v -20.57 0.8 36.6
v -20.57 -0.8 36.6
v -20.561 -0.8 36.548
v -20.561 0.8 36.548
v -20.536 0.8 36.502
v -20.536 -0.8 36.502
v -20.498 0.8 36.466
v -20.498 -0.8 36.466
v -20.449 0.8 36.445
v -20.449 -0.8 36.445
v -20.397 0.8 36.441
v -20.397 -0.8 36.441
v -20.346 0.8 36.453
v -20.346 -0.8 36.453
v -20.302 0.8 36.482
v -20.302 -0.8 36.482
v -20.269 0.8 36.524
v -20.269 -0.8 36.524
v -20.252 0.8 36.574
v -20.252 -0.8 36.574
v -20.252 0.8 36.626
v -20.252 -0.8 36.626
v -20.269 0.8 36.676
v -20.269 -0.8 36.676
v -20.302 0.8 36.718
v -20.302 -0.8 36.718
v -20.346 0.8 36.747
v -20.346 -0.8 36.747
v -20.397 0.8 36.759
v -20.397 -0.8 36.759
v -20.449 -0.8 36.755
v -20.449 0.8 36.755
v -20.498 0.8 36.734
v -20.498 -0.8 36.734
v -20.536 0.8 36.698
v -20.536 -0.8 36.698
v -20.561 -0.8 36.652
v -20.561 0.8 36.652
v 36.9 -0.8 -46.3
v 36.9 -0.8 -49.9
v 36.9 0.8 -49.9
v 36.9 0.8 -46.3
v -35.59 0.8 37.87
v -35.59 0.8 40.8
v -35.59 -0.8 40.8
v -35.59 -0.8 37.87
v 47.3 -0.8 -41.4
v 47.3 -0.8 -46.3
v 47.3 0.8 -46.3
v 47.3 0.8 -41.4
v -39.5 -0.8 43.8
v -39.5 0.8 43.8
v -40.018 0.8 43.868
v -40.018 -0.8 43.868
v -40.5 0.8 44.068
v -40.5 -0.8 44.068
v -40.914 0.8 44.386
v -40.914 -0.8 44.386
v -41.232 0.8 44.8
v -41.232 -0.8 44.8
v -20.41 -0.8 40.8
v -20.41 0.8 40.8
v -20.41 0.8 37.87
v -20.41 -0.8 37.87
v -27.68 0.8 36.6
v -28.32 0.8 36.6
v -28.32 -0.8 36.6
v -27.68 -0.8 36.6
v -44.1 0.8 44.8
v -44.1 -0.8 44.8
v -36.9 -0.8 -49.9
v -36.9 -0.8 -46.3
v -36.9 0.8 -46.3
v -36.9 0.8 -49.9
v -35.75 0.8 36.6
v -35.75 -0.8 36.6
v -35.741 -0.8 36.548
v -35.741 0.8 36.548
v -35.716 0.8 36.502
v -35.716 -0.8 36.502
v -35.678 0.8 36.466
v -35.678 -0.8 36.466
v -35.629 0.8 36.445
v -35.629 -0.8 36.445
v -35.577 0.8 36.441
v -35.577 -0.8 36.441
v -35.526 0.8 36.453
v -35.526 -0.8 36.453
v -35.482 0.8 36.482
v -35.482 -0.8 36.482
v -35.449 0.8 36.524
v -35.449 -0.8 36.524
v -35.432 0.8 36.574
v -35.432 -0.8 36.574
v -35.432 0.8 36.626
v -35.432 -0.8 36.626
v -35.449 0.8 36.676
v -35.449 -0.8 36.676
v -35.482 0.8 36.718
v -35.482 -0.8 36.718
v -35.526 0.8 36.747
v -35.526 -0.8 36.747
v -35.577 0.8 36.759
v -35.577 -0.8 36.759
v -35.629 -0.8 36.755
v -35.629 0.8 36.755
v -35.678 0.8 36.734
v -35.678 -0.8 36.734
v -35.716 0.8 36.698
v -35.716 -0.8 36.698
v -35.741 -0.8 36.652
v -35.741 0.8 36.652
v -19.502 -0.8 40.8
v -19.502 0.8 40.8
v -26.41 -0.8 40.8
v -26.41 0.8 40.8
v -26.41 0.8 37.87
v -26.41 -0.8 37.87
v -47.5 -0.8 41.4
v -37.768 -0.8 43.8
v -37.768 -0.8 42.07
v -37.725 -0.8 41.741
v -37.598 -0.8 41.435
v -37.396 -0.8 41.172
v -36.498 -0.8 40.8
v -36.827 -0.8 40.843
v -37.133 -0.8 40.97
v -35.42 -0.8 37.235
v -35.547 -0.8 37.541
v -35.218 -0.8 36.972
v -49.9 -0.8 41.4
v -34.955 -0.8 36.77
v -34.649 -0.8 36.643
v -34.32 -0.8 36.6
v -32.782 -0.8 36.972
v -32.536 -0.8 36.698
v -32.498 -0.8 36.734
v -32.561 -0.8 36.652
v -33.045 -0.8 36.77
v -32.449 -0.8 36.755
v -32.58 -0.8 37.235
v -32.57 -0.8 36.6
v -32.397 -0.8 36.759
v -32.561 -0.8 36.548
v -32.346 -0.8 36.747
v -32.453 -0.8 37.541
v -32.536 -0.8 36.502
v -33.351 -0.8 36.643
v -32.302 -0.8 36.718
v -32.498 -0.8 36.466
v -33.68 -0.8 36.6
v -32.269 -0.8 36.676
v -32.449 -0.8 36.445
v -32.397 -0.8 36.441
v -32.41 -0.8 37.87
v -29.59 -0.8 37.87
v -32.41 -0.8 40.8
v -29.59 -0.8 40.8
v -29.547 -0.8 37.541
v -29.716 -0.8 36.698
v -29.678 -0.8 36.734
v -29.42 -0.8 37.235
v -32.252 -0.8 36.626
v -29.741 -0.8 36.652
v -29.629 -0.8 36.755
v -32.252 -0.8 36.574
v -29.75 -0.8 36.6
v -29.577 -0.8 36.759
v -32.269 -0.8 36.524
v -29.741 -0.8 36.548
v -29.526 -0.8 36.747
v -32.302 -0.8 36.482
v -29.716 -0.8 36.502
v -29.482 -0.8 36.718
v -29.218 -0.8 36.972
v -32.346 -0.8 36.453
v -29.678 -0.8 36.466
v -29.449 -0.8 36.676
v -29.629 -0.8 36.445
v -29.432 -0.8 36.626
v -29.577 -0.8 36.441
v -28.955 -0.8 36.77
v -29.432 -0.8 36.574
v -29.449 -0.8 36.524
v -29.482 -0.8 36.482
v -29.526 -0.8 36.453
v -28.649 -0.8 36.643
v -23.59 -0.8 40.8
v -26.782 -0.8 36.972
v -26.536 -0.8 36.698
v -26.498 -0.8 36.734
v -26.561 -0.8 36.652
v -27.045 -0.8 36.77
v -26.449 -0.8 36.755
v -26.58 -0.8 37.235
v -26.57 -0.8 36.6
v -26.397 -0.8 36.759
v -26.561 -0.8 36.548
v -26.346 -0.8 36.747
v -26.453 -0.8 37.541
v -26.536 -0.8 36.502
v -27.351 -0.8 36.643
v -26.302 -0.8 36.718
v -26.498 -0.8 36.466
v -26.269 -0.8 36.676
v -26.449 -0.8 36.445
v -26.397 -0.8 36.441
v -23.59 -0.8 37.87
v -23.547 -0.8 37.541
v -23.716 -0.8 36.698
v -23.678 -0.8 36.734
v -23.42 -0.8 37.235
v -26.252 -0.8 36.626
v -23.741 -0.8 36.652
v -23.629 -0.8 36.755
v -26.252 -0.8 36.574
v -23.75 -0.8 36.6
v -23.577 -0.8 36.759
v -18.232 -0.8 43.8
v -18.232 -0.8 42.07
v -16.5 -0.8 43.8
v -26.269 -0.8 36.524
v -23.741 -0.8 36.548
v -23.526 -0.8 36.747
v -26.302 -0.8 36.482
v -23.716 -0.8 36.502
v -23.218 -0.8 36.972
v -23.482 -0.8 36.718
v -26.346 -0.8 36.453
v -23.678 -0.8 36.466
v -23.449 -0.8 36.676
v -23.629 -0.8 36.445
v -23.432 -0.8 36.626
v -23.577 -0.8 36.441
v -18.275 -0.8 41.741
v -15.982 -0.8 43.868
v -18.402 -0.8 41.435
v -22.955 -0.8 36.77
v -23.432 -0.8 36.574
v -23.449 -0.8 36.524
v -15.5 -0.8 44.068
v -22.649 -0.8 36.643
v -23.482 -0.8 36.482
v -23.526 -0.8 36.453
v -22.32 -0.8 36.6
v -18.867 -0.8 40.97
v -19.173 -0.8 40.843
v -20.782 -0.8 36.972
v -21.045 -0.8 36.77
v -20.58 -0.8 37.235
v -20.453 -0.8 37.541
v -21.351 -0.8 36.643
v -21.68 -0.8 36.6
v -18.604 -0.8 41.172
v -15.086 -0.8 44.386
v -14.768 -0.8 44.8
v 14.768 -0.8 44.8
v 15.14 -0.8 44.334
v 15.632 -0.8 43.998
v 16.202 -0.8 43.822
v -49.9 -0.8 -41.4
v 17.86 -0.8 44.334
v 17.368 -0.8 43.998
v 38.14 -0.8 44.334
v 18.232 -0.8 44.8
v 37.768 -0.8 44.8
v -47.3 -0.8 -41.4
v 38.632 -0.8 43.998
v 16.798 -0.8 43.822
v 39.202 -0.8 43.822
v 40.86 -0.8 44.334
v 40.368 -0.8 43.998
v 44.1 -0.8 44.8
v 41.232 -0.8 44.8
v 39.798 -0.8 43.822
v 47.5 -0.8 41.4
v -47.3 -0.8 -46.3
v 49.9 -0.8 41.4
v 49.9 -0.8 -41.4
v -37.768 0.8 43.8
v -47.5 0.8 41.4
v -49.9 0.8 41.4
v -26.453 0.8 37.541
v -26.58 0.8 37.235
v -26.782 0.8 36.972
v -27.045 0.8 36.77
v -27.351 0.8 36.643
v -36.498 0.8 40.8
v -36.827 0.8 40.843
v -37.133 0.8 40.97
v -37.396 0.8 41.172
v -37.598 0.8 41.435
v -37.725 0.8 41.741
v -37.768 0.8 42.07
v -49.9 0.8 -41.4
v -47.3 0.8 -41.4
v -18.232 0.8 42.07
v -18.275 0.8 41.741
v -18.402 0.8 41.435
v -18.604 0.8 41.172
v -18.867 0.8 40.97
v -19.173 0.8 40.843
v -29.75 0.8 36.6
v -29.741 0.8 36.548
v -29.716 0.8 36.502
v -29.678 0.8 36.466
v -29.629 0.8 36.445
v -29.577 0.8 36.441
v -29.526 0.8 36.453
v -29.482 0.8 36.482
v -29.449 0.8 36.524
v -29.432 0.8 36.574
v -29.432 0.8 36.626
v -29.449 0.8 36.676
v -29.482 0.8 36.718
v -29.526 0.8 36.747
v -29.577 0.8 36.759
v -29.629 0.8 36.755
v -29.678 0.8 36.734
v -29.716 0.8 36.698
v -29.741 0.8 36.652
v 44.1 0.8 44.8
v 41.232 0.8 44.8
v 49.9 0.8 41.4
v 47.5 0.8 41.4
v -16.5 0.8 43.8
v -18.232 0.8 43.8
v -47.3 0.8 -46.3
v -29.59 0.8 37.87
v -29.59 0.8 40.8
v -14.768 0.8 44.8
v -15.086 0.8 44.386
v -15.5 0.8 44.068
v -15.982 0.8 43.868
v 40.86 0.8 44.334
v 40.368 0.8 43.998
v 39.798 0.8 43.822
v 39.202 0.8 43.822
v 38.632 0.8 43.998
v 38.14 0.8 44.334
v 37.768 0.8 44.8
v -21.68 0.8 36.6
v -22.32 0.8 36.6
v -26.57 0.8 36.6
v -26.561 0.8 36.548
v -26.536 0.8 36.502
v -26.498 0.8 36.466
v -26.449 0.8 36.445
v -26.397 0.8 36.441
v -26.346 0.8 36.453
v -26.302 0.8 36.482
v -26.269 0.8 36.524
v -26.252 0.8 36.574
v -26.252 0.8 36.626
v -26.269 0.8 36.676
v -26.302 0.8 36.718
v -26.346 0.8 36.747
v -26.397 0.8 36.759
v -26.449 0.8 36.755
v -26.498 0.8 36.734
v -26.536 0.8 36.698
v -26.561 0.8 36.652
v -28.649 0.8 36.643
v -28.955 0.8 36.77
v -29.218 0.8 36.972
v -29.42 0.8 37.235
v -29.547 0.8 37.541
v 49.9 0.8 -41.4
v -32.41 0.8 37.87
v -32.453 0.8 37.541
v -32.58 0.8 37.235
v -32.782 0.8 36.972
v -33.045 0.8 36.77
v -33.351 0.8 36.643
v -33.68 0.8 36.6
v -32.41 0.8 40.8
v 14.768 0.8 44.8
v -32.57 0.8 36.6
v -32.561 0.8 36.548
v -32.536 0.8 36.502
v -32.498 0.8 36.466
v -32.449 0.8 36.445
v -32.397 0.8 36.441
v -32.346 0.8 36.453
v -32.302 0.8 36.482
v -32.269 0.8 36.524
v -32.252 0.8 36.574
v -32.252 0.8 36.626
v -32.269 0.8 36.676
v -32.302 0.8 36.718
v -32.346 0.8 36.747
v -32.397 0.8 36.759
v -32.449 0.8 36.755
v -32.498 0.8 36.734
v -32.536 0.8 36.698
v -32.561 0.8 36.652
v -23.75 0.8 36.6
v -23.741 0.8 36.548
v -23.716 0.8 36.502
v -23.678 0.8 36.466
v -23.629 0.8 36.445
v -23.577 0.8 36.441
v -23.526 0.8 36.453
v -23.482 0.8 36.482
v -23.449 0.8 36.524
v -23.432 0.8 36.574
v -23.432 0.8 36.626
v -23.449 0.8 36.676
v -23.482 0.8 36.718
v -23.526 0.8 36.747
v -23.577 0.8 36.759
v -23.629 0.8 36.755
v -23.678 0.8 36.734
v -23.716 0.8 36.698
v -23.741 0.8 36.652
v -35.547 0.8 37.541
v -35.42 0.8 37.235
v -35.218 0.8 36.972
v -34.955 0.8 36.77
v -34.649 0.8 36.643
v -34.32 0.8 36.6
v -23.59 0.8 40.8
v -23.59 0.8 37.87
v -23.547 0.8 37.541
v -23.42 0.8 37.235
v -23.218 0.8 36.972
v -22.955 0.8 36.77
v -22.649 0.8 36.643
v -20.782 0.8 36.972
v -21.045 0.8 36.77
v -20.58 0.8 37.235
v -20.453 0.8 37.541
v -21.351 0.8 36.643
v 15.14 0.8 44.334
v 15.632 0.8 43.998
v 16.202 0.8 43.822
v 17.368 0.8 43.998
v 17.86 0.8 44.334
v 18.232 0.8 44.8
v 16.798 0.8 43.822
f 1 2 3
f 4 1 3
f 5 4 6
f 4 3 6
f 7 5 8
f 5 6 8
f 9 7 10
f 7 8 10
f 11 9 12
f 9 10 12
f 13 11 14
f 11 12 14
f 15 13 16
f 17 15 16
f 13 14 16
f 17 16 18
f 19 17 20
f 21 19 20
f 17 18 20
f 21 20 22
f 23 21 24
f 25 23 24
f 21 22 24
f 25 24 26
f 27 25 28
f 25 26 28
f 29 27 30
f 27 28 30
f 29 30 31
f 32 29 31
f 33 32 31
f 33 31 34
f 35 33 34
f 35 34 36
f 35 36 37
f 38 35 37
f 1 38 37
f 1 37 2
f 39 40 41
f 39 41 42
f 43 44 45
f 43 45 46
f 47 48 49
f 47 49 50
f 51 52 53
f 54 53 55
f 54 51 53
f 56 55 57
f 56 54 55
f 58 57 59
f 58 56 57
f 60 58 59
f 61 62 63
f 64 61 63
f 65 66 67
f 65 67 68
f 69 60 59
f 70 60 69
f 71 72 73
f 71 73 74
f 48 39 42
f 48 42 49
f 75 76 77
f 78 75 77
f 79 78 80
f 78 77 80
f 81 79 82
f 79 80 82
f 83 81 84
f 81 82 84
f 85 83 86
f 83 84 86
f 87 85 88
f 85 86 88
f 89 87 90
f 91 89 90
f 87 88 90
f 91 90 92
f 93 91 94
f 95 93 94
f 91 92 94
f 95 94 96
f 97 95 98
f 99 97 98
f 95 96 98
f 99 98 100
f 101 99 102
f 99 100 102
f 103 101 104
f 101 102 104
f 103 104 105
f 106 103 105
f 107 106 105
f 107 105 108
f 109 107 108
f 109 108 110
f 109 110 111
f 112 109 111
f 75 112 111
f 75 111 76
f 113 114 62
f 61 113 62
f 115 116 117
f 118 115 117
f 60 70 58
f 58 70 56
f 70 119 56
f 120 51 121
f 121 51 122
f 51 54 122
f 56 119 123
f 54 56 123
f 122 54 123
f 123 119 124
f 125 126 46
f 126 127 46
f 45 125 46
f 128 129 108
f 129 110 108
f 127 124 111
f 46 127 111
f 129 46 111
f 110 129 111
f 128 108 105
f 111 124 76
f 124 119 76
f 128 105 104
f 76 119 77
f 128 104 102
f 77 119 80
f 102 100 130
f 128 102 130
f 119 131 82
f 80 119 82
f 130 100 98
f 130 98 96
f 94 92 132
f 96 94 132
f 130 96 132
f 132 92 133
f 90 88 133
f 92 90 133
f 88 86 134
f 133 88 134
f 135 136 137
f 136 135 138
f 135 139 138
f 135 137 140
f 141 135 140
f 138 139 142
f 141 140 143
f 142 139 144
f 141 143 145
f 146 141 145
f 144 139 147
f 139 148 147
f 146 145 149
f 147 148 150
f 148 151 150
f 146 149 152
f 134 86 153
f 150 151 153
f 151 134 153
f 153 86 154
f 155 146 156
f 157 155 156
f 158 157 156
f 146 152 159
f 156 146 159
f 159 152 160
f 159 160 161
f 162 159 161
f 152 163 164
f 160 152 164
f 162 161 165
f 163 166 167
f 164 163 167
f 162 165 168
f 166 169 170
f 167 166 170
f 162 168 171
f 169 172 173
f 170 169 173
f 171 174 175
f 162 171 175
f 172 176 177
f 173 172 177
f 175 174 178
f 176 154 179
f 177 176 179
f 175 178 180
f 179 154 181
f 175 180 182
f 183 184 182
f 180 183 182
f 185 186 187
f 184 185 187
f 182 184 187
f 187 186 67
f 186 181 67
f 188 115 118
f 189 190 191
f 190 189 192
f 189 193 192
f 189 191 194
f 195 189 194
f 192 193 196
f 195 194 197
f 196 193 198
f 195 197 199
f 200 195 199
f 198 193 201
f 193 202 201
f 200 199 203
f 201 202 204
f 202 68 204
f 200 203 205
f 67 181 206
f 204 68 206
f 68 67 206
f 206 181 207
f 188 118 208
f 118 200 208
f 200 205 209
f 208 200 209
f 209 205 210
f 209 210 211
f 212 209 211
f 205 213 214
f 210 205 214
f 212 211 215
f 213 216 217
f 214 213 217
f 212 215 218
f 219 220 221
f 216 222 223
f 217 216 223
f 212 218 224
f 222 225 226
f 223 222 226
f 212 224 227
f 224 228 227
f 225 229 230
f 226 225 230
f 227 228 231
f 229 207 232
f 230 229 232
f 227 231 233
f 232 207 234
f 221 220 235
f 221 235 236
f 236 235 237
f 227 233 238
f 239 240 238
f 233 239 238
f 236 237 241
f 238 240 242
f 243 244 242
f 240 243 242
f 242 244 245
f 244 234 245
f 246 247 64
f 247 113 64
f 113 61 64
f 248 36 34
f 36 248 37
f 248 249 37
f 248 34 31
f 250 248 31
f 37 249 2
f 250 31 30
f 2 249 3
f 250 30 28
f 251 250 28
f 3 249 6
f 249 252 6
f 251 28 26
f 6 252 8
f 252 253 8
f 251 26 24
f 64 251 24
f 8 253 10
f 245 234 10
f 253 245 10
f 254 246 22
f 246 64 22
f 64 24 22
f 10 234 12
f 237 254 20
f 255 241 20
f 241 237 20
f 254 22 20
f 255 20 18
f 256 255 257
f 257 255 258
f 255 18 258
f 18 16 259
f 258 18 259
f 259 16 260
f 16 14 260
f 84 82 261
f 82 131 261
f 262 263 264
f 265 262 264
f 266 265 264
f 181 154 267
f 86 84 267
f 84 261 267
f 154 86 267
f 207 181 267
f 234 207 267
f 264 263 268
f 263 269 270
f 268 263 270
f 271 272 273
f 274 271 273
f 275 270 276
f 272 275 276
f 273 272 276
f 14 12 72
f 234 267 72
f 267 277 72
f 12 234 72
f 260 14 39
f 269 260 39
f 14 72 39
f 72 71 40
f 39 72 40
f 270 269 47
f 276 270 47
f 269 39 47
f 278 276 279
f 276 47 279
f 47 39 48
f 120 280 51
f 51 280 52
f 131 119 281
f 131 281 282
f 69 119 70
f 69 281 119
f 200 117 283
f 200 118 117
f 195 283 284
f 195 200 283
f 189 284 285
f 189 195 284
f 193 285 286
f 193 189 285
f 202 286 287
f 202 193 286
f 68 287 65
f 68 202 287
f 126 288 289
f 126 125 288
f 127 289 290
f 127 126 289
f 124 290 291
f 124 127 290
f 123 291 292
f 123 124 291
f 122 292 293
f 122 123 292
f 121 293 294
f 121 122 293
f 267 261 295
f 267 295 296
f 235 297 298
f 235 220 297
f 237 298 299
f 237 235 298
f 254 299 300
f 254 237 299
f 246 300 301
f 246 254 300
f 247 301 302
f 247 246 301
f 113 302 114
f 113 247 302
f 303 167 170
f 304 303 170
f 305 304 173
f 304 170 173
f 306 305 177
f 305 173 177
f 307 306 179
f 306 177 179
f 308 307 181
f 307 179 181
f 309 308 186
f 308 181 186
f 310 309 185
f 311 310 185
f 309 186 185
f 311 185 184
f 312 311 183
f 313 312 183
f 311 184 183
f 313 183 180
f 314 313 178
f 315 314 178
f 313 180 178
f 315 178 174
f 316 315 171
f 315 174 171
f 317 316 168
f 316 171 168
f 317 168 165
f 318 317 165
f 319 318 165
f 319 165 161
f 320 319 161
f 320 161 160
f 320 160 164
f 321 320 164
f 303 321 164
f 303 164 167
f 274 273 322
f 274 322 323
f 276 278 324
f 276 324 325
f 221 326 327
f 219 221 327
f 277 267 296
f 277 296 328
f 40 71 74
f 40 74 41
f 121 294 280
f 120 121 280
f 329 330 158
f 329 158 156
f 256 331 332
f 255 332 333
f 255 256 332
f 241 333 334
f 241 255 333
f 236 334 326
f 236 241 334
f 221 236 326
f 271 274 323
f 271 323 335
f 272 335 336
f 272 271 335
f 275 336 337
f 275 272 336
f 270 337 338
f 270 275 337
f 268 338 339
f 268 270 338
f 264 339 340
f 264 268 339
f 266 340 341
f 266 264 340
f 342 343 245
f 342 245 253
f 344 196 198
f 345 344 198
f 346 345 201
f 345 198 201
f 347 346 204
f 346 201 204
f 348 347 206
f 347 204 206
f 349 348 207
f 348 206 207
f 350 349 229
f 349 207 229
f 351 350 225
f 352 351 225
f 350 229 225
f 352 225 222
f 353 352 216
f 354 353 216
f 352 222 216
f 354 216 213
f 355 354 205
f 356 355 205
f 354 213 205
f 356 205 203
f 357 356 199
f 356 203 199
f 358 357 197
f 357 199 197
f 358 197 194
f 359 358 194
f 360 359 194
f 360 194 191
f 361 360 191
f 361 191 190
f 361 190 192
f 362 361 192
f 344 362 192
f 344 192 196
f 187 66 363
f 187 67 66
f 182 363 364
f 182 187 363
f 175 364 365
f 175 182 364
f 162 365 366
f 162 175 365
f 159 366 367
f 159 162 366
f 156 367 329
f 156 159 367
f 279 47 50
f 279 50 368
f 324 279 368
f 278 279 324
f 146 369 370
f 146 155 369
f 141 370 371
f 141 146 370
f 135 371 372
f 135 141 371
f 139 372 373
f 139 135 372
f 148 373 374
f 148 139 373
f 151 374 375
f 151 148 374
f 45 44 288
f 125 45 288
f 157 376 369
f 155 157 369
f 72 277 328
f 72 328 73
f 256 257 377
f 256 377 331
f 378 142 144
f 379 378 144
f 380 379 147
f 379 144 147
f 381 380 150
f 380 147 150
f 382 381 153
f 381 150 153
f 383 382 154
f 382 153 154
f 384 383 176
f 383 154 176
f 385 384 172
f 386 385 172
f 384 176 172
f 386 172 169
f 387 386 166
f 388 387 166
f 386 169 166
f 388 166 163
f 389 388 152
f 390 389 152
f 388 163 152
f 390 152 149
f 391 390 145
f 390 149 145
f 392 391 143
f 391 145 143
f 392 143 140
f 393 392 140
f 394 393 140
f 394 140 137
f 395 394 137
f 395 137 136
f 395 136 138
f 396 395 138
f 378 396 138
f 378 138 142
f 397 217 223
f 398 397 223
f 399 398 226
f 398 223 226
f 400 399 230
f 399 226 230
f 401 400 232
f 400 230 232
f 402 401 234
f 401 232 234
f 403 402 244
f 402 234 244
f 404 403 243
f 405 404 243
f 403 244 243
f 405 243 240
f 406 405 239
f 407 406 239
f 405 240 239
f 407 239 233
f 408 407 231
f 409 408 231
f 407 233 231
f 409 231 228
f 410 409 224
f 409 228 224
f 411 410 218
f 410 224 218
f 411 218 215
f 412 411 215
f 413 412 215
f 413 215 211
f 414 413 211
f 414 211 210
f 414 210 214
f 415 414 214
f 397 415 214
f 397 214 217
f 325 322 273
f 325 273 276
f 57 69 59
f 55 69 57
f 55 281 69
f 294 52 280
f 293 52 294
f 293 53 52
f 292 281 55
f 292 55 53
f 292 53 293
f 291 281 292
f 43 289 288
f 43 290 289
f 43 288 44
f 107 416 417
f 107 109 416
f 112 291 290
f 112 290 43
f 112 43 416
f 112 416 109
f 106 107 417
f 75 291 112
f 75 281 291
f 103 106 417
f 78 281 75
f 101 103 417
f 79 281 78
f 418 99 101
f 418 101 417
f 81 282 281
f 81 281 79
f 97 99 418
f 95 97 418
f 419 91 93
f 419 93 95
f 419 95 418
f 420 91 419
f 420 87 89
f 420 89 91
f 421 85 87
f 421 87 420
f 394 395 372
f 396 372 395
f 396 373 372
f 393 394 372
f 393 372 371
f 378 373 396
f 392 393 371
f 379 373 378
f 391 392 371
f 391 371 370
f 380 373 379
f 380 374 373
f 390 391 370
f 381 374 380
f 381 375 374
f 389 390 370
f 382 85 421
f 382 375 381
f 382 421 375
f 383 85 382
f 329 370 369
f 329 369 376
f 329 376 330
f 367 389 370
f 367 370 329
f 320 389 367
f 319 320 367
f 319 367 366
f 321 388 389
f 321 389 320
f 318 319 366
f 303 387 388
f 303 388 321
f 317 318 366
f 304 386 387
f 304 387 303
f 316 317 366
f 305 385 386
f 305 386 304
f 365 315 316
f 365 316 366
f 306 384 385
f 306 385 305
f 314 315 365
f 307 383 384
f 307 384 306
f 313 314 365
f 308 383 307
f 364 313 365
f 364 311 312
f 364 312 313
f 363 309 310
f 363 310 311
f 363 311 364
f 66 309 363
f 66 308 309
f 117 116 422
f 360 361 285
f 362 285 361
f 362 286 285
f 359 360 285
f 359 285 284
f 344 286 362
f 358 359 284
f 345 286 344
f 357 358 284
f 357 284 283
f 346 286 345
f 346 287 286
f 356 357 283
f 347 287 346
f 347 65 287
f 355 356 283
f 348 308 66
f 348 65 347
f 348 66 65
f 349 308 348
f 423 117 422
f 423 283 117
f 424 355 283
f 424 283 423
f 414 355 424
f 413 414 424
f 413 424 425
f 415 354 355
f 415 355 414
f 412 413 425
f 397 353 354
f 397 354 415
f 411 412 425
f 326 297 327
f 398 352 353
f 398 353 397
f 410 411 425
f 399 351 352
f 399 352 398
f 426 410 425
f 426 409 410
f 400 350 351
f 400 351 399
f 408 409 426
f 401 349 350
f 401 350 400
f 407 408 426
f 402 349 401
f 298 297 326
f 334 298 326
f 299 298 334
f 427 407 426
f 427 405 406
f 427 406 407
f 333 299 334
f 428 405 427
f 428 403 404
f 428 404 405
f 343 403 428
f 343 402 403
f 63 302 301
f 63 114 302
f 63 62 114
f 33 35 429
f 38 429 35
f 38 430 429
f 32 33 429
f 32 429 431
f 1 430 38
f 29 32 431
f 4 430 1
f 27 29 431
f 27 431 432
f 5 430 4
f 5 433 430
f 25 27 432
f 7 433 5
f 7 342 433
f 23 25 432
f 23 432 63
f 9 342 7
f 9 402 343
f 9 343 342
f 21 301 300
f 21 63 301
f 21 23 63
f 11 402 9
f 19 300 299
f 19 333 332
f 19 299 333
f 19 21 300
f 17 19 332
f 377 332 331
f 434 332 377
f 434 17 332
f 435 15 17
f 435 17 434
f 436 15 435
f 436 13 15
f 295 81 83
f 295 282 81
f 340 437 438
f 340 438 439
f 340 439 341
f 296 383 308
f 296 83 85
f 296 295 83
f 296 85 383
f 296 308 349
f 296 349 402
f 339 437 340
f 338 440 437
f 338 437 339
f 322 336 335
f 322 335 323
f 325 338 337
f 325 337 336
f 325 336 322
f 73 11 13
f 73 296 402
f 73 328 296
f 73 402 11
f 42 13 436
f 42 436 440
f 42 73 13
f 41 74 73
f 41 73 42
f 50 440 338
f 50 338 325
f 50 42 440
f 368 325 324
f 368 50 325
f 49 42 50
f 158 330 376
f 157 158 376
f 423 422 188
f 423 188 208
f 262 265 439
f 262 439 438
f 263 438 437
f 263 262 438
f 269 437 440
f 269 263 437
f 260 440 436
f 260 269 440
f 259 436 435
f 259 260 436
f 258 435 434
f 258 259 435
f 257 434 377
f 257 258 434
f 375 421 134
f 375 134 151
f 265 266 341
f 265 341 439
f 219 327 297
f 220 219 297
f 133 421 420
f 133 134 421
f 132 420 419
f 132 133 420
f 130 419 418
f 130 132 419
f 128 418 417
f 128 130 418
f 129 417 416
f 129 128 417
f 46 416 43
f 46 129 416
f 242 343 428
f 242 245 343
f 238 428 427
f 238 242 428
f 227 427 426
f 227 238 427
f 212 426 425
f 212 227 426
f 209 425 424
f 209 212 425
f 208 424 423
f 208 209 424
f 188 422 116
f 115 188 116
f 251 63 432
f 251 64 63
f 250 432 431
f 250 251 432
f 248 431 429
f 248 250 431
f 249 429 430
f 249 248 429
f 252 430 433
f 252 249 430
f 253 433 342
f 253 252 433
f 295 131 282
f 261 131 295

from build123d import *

# Parameters (mm, degrees)
GENERALSHAPE_DEPTH           = 0.8
ADDTOLERANCE_DEPTH           = 71.715203457
ADDTOLERANCE_DEPTH_BACK      = 71.715203457
BACKPLANE_DEPTH              = 71.573791169
BACKPLANE_DEPTH_BACK         = 71.573791169
RF_W                         = 3.18
RF_H                         = 4.2
CUT_EXTRUDE1_DEPTH           = 71.587392642
FILLET1_R                    = 1.27
F_0_32_0_32_DIAMETER_HOLE1_D = 0.32


with BuildPart() as part:
    # Sketch2 → GeneralShape (new, symmetric)
    with BuildSketch(Plane(origin=(0, 0, 0), x_dir=(1, 0, 0), z_dir=(0, 1, 0))):
        Polygon((47.4, 46.4), (37, 46.4), (37, 50), (-37, 50), (-37, 46.4), (-47.4, 46.4), (-47.4, 41.5), (-50, 41.5), (-50, -41.5), (-47.4, -41.5), (-41.5, -47.4), (41.5, -47.4), (47.4, -41.5), (50, -41.5), (50, 41.5), (47.4, 41.5), align=None)
    extrude(amount=GENERALSHAPE_DEPTH, both=True)

    # Sketch3 → AddTolerance (cut, two sides: drawn at the far end of the back side and taken through both)
    with BuildSketch(Plane(origin=(0, 0, 0), x_dir=(1, 0, 0), z_dir=(0, 1, 0)).offset(-ADDTOLERANCE_DEPTH_BACK)):
        Polygon((37, 50), (-37, 50), (-37, 46.4), (-47.4, 46.4), (-47.4, 41.5), (-50, 41.5), (-50, -41.5), (-47.4, -41.5), (-47.5, -41.4), (-49.9, -41.4), (-49.9, 41.4), (-47.3, 41.4), (-47.3, 46.3), (-36.9, 46.3), (-36.9, 49.9), (36.9, 49.9), (36.9, 46.3), (47.3, 46.3), (47.3, 41.4), (49.9, 41.4), (49.9, -41.4), (47.5, -41.4), (47.4, -41.5), (50, -41.5), (50, 41.5), (47.4, 41.5), (47.4, 46.4), (37, 46.4), align=None)
    extrude(amount=ADDTOLERANCE_DEPTH + ADDTOLERANCE_DEPTH_BACK, mode=Mode.SUBTRACT)

    # Sketch4 → Backplane (cut, two sides: drawn at the far end of the back side and taken through both)
    with BuildSketch(Plane(origin=(0, 0, 0), x_dir=(1, 0, 0), z_dir=(0, 1, 0)).offset(-BACKPLANE_DEPTH_BACK)):
        with BuildLine():
            Line((41.5, -47.4), (44.1, -44.8))
            Line((44.1, -44.8), (41.232050808, -44.8))
            ThreePointArc((41.232050808, -44.8), (39.5, -43.8), (37.767949192, -44.8))
            Line((37.767949192, -44.8), (18.232050808, -44.8))
            ThreePointArc((18.232050808, -44.8), (16.5, -43.8), (14.767949192, -44.8))
            Line((14.767949192, -44.8), (-14.767949192, -44.8))
            ThreePointArc((-14.767949192, -44.8), (-16.5, -43.8), (-18.232050808, -44.8))
            Line((-18.232050808, -44.8), (-37.767949192, -44.8))
            ThreePointArc((-37.767949192, -44.8), (-39.5, -43.8), (-41.232050808, -44.8))
            Line((-41.232050808, -44.8), (-44.1, -44.8))
            Line((-44.1, -44.8), (-41.5, -47.4))
            Line((-41.5, -47.4), (41.5, -47.4))
        make_face()
    extrude(amount=BACKPLANE_DEPTH + BACKPLANE_DEPTH_BACK, mode=Mode.SUBTRACT)

    # RF → Cut-Extrude1 (cut, through all)
    with BuildSketch(Plane(origin=(0, 0.8, 0), x_dir=(1, 0, 0), z_dir=(0, 1, 0))):
        with Locations((-22, -38.7)):
            Rectangle(RF_W, RF_H)
        with Locations((-28, -38.7)):
            Rectangle(RF_W, RF_H)
        with Locations((-34, -38.7)):
            Rectangle(RF_W, RF_H)
        with BuildLine():
            Line((-18.232050808, -40.8), (-20.41, -40.8))
            Line((-20.41, -40.8), (-23.59, -40.8))
            Line((-23.59, -40.8), (-26.41, -40.8))
            Line((-26.41, -40.8), (-29.59, -40.8))
            Line((-29.59, -40.8), (-32.41, -40.8))
            Line((-32.41, -40.8), (-35.59, -40.8))
            Line((-35.59, -40.8), (-37.767949192, -40.8))
            Line((-37.767949192, -40.8), (-37.767949192, -43.8))
            Line((-37.767949192, -43.8), (-39.5, -43.8))
            ThreePointArc((-39.5, -43.8), (-38.5, -44.067949192), (-37.767949192, -44.8))
            Line((-37.767949192, -44.8), (-18.232050808, -44.8))
            ThreePointArc((-18.232050808, -44.8), (-17.5, -44.067949192), (-16.5, -43.8))
            Line((-16.5, -43.8), (-18.232050808, -43.8))
            Line((-18.232050808, -43.8), (-18.232050808, -40.8))
        make_face()
    extrude(amount=-CUT_EXTRUDE1_DEPTH, mode=Mode.SUBTRACT)

    # Fillet1
    fillet1_edges = [part.edges().sort_by_distance(p)[0] for p in [
        (-23.59, 0, 36.6),
        (-20.41, 0, 36.6),
        (-18.232050808, 0, 40.8),
        (-37.767949192, 0, 40.8),
        (-35.59, 0, 36.6),
        (-32.41, 0, 36.6),
        (-29.59, 0, 36.6),
        (-26.41, 0, 36.6),
    ]]
    fillet(fillet1_edges, radius=FILLET1_R)

    # Ø0.32 (0.32) Diameter Hole1 (through all)
    with Locations(Plane(origin=(0, 0.8, 0), x_dir=(1, 0, 0), z_dir=(0, 1, 0))):
        with Locations((-20.41, -36.6), (-23.59, -36.6), (-26.41, -36.6), (-29.59, -36.6), (-32.41, -36.6), (-35.59, -36.6)):
            Hole(F_0_32_0_32_DIAMETER_HOLE1_D / 2)


solid = part.part
